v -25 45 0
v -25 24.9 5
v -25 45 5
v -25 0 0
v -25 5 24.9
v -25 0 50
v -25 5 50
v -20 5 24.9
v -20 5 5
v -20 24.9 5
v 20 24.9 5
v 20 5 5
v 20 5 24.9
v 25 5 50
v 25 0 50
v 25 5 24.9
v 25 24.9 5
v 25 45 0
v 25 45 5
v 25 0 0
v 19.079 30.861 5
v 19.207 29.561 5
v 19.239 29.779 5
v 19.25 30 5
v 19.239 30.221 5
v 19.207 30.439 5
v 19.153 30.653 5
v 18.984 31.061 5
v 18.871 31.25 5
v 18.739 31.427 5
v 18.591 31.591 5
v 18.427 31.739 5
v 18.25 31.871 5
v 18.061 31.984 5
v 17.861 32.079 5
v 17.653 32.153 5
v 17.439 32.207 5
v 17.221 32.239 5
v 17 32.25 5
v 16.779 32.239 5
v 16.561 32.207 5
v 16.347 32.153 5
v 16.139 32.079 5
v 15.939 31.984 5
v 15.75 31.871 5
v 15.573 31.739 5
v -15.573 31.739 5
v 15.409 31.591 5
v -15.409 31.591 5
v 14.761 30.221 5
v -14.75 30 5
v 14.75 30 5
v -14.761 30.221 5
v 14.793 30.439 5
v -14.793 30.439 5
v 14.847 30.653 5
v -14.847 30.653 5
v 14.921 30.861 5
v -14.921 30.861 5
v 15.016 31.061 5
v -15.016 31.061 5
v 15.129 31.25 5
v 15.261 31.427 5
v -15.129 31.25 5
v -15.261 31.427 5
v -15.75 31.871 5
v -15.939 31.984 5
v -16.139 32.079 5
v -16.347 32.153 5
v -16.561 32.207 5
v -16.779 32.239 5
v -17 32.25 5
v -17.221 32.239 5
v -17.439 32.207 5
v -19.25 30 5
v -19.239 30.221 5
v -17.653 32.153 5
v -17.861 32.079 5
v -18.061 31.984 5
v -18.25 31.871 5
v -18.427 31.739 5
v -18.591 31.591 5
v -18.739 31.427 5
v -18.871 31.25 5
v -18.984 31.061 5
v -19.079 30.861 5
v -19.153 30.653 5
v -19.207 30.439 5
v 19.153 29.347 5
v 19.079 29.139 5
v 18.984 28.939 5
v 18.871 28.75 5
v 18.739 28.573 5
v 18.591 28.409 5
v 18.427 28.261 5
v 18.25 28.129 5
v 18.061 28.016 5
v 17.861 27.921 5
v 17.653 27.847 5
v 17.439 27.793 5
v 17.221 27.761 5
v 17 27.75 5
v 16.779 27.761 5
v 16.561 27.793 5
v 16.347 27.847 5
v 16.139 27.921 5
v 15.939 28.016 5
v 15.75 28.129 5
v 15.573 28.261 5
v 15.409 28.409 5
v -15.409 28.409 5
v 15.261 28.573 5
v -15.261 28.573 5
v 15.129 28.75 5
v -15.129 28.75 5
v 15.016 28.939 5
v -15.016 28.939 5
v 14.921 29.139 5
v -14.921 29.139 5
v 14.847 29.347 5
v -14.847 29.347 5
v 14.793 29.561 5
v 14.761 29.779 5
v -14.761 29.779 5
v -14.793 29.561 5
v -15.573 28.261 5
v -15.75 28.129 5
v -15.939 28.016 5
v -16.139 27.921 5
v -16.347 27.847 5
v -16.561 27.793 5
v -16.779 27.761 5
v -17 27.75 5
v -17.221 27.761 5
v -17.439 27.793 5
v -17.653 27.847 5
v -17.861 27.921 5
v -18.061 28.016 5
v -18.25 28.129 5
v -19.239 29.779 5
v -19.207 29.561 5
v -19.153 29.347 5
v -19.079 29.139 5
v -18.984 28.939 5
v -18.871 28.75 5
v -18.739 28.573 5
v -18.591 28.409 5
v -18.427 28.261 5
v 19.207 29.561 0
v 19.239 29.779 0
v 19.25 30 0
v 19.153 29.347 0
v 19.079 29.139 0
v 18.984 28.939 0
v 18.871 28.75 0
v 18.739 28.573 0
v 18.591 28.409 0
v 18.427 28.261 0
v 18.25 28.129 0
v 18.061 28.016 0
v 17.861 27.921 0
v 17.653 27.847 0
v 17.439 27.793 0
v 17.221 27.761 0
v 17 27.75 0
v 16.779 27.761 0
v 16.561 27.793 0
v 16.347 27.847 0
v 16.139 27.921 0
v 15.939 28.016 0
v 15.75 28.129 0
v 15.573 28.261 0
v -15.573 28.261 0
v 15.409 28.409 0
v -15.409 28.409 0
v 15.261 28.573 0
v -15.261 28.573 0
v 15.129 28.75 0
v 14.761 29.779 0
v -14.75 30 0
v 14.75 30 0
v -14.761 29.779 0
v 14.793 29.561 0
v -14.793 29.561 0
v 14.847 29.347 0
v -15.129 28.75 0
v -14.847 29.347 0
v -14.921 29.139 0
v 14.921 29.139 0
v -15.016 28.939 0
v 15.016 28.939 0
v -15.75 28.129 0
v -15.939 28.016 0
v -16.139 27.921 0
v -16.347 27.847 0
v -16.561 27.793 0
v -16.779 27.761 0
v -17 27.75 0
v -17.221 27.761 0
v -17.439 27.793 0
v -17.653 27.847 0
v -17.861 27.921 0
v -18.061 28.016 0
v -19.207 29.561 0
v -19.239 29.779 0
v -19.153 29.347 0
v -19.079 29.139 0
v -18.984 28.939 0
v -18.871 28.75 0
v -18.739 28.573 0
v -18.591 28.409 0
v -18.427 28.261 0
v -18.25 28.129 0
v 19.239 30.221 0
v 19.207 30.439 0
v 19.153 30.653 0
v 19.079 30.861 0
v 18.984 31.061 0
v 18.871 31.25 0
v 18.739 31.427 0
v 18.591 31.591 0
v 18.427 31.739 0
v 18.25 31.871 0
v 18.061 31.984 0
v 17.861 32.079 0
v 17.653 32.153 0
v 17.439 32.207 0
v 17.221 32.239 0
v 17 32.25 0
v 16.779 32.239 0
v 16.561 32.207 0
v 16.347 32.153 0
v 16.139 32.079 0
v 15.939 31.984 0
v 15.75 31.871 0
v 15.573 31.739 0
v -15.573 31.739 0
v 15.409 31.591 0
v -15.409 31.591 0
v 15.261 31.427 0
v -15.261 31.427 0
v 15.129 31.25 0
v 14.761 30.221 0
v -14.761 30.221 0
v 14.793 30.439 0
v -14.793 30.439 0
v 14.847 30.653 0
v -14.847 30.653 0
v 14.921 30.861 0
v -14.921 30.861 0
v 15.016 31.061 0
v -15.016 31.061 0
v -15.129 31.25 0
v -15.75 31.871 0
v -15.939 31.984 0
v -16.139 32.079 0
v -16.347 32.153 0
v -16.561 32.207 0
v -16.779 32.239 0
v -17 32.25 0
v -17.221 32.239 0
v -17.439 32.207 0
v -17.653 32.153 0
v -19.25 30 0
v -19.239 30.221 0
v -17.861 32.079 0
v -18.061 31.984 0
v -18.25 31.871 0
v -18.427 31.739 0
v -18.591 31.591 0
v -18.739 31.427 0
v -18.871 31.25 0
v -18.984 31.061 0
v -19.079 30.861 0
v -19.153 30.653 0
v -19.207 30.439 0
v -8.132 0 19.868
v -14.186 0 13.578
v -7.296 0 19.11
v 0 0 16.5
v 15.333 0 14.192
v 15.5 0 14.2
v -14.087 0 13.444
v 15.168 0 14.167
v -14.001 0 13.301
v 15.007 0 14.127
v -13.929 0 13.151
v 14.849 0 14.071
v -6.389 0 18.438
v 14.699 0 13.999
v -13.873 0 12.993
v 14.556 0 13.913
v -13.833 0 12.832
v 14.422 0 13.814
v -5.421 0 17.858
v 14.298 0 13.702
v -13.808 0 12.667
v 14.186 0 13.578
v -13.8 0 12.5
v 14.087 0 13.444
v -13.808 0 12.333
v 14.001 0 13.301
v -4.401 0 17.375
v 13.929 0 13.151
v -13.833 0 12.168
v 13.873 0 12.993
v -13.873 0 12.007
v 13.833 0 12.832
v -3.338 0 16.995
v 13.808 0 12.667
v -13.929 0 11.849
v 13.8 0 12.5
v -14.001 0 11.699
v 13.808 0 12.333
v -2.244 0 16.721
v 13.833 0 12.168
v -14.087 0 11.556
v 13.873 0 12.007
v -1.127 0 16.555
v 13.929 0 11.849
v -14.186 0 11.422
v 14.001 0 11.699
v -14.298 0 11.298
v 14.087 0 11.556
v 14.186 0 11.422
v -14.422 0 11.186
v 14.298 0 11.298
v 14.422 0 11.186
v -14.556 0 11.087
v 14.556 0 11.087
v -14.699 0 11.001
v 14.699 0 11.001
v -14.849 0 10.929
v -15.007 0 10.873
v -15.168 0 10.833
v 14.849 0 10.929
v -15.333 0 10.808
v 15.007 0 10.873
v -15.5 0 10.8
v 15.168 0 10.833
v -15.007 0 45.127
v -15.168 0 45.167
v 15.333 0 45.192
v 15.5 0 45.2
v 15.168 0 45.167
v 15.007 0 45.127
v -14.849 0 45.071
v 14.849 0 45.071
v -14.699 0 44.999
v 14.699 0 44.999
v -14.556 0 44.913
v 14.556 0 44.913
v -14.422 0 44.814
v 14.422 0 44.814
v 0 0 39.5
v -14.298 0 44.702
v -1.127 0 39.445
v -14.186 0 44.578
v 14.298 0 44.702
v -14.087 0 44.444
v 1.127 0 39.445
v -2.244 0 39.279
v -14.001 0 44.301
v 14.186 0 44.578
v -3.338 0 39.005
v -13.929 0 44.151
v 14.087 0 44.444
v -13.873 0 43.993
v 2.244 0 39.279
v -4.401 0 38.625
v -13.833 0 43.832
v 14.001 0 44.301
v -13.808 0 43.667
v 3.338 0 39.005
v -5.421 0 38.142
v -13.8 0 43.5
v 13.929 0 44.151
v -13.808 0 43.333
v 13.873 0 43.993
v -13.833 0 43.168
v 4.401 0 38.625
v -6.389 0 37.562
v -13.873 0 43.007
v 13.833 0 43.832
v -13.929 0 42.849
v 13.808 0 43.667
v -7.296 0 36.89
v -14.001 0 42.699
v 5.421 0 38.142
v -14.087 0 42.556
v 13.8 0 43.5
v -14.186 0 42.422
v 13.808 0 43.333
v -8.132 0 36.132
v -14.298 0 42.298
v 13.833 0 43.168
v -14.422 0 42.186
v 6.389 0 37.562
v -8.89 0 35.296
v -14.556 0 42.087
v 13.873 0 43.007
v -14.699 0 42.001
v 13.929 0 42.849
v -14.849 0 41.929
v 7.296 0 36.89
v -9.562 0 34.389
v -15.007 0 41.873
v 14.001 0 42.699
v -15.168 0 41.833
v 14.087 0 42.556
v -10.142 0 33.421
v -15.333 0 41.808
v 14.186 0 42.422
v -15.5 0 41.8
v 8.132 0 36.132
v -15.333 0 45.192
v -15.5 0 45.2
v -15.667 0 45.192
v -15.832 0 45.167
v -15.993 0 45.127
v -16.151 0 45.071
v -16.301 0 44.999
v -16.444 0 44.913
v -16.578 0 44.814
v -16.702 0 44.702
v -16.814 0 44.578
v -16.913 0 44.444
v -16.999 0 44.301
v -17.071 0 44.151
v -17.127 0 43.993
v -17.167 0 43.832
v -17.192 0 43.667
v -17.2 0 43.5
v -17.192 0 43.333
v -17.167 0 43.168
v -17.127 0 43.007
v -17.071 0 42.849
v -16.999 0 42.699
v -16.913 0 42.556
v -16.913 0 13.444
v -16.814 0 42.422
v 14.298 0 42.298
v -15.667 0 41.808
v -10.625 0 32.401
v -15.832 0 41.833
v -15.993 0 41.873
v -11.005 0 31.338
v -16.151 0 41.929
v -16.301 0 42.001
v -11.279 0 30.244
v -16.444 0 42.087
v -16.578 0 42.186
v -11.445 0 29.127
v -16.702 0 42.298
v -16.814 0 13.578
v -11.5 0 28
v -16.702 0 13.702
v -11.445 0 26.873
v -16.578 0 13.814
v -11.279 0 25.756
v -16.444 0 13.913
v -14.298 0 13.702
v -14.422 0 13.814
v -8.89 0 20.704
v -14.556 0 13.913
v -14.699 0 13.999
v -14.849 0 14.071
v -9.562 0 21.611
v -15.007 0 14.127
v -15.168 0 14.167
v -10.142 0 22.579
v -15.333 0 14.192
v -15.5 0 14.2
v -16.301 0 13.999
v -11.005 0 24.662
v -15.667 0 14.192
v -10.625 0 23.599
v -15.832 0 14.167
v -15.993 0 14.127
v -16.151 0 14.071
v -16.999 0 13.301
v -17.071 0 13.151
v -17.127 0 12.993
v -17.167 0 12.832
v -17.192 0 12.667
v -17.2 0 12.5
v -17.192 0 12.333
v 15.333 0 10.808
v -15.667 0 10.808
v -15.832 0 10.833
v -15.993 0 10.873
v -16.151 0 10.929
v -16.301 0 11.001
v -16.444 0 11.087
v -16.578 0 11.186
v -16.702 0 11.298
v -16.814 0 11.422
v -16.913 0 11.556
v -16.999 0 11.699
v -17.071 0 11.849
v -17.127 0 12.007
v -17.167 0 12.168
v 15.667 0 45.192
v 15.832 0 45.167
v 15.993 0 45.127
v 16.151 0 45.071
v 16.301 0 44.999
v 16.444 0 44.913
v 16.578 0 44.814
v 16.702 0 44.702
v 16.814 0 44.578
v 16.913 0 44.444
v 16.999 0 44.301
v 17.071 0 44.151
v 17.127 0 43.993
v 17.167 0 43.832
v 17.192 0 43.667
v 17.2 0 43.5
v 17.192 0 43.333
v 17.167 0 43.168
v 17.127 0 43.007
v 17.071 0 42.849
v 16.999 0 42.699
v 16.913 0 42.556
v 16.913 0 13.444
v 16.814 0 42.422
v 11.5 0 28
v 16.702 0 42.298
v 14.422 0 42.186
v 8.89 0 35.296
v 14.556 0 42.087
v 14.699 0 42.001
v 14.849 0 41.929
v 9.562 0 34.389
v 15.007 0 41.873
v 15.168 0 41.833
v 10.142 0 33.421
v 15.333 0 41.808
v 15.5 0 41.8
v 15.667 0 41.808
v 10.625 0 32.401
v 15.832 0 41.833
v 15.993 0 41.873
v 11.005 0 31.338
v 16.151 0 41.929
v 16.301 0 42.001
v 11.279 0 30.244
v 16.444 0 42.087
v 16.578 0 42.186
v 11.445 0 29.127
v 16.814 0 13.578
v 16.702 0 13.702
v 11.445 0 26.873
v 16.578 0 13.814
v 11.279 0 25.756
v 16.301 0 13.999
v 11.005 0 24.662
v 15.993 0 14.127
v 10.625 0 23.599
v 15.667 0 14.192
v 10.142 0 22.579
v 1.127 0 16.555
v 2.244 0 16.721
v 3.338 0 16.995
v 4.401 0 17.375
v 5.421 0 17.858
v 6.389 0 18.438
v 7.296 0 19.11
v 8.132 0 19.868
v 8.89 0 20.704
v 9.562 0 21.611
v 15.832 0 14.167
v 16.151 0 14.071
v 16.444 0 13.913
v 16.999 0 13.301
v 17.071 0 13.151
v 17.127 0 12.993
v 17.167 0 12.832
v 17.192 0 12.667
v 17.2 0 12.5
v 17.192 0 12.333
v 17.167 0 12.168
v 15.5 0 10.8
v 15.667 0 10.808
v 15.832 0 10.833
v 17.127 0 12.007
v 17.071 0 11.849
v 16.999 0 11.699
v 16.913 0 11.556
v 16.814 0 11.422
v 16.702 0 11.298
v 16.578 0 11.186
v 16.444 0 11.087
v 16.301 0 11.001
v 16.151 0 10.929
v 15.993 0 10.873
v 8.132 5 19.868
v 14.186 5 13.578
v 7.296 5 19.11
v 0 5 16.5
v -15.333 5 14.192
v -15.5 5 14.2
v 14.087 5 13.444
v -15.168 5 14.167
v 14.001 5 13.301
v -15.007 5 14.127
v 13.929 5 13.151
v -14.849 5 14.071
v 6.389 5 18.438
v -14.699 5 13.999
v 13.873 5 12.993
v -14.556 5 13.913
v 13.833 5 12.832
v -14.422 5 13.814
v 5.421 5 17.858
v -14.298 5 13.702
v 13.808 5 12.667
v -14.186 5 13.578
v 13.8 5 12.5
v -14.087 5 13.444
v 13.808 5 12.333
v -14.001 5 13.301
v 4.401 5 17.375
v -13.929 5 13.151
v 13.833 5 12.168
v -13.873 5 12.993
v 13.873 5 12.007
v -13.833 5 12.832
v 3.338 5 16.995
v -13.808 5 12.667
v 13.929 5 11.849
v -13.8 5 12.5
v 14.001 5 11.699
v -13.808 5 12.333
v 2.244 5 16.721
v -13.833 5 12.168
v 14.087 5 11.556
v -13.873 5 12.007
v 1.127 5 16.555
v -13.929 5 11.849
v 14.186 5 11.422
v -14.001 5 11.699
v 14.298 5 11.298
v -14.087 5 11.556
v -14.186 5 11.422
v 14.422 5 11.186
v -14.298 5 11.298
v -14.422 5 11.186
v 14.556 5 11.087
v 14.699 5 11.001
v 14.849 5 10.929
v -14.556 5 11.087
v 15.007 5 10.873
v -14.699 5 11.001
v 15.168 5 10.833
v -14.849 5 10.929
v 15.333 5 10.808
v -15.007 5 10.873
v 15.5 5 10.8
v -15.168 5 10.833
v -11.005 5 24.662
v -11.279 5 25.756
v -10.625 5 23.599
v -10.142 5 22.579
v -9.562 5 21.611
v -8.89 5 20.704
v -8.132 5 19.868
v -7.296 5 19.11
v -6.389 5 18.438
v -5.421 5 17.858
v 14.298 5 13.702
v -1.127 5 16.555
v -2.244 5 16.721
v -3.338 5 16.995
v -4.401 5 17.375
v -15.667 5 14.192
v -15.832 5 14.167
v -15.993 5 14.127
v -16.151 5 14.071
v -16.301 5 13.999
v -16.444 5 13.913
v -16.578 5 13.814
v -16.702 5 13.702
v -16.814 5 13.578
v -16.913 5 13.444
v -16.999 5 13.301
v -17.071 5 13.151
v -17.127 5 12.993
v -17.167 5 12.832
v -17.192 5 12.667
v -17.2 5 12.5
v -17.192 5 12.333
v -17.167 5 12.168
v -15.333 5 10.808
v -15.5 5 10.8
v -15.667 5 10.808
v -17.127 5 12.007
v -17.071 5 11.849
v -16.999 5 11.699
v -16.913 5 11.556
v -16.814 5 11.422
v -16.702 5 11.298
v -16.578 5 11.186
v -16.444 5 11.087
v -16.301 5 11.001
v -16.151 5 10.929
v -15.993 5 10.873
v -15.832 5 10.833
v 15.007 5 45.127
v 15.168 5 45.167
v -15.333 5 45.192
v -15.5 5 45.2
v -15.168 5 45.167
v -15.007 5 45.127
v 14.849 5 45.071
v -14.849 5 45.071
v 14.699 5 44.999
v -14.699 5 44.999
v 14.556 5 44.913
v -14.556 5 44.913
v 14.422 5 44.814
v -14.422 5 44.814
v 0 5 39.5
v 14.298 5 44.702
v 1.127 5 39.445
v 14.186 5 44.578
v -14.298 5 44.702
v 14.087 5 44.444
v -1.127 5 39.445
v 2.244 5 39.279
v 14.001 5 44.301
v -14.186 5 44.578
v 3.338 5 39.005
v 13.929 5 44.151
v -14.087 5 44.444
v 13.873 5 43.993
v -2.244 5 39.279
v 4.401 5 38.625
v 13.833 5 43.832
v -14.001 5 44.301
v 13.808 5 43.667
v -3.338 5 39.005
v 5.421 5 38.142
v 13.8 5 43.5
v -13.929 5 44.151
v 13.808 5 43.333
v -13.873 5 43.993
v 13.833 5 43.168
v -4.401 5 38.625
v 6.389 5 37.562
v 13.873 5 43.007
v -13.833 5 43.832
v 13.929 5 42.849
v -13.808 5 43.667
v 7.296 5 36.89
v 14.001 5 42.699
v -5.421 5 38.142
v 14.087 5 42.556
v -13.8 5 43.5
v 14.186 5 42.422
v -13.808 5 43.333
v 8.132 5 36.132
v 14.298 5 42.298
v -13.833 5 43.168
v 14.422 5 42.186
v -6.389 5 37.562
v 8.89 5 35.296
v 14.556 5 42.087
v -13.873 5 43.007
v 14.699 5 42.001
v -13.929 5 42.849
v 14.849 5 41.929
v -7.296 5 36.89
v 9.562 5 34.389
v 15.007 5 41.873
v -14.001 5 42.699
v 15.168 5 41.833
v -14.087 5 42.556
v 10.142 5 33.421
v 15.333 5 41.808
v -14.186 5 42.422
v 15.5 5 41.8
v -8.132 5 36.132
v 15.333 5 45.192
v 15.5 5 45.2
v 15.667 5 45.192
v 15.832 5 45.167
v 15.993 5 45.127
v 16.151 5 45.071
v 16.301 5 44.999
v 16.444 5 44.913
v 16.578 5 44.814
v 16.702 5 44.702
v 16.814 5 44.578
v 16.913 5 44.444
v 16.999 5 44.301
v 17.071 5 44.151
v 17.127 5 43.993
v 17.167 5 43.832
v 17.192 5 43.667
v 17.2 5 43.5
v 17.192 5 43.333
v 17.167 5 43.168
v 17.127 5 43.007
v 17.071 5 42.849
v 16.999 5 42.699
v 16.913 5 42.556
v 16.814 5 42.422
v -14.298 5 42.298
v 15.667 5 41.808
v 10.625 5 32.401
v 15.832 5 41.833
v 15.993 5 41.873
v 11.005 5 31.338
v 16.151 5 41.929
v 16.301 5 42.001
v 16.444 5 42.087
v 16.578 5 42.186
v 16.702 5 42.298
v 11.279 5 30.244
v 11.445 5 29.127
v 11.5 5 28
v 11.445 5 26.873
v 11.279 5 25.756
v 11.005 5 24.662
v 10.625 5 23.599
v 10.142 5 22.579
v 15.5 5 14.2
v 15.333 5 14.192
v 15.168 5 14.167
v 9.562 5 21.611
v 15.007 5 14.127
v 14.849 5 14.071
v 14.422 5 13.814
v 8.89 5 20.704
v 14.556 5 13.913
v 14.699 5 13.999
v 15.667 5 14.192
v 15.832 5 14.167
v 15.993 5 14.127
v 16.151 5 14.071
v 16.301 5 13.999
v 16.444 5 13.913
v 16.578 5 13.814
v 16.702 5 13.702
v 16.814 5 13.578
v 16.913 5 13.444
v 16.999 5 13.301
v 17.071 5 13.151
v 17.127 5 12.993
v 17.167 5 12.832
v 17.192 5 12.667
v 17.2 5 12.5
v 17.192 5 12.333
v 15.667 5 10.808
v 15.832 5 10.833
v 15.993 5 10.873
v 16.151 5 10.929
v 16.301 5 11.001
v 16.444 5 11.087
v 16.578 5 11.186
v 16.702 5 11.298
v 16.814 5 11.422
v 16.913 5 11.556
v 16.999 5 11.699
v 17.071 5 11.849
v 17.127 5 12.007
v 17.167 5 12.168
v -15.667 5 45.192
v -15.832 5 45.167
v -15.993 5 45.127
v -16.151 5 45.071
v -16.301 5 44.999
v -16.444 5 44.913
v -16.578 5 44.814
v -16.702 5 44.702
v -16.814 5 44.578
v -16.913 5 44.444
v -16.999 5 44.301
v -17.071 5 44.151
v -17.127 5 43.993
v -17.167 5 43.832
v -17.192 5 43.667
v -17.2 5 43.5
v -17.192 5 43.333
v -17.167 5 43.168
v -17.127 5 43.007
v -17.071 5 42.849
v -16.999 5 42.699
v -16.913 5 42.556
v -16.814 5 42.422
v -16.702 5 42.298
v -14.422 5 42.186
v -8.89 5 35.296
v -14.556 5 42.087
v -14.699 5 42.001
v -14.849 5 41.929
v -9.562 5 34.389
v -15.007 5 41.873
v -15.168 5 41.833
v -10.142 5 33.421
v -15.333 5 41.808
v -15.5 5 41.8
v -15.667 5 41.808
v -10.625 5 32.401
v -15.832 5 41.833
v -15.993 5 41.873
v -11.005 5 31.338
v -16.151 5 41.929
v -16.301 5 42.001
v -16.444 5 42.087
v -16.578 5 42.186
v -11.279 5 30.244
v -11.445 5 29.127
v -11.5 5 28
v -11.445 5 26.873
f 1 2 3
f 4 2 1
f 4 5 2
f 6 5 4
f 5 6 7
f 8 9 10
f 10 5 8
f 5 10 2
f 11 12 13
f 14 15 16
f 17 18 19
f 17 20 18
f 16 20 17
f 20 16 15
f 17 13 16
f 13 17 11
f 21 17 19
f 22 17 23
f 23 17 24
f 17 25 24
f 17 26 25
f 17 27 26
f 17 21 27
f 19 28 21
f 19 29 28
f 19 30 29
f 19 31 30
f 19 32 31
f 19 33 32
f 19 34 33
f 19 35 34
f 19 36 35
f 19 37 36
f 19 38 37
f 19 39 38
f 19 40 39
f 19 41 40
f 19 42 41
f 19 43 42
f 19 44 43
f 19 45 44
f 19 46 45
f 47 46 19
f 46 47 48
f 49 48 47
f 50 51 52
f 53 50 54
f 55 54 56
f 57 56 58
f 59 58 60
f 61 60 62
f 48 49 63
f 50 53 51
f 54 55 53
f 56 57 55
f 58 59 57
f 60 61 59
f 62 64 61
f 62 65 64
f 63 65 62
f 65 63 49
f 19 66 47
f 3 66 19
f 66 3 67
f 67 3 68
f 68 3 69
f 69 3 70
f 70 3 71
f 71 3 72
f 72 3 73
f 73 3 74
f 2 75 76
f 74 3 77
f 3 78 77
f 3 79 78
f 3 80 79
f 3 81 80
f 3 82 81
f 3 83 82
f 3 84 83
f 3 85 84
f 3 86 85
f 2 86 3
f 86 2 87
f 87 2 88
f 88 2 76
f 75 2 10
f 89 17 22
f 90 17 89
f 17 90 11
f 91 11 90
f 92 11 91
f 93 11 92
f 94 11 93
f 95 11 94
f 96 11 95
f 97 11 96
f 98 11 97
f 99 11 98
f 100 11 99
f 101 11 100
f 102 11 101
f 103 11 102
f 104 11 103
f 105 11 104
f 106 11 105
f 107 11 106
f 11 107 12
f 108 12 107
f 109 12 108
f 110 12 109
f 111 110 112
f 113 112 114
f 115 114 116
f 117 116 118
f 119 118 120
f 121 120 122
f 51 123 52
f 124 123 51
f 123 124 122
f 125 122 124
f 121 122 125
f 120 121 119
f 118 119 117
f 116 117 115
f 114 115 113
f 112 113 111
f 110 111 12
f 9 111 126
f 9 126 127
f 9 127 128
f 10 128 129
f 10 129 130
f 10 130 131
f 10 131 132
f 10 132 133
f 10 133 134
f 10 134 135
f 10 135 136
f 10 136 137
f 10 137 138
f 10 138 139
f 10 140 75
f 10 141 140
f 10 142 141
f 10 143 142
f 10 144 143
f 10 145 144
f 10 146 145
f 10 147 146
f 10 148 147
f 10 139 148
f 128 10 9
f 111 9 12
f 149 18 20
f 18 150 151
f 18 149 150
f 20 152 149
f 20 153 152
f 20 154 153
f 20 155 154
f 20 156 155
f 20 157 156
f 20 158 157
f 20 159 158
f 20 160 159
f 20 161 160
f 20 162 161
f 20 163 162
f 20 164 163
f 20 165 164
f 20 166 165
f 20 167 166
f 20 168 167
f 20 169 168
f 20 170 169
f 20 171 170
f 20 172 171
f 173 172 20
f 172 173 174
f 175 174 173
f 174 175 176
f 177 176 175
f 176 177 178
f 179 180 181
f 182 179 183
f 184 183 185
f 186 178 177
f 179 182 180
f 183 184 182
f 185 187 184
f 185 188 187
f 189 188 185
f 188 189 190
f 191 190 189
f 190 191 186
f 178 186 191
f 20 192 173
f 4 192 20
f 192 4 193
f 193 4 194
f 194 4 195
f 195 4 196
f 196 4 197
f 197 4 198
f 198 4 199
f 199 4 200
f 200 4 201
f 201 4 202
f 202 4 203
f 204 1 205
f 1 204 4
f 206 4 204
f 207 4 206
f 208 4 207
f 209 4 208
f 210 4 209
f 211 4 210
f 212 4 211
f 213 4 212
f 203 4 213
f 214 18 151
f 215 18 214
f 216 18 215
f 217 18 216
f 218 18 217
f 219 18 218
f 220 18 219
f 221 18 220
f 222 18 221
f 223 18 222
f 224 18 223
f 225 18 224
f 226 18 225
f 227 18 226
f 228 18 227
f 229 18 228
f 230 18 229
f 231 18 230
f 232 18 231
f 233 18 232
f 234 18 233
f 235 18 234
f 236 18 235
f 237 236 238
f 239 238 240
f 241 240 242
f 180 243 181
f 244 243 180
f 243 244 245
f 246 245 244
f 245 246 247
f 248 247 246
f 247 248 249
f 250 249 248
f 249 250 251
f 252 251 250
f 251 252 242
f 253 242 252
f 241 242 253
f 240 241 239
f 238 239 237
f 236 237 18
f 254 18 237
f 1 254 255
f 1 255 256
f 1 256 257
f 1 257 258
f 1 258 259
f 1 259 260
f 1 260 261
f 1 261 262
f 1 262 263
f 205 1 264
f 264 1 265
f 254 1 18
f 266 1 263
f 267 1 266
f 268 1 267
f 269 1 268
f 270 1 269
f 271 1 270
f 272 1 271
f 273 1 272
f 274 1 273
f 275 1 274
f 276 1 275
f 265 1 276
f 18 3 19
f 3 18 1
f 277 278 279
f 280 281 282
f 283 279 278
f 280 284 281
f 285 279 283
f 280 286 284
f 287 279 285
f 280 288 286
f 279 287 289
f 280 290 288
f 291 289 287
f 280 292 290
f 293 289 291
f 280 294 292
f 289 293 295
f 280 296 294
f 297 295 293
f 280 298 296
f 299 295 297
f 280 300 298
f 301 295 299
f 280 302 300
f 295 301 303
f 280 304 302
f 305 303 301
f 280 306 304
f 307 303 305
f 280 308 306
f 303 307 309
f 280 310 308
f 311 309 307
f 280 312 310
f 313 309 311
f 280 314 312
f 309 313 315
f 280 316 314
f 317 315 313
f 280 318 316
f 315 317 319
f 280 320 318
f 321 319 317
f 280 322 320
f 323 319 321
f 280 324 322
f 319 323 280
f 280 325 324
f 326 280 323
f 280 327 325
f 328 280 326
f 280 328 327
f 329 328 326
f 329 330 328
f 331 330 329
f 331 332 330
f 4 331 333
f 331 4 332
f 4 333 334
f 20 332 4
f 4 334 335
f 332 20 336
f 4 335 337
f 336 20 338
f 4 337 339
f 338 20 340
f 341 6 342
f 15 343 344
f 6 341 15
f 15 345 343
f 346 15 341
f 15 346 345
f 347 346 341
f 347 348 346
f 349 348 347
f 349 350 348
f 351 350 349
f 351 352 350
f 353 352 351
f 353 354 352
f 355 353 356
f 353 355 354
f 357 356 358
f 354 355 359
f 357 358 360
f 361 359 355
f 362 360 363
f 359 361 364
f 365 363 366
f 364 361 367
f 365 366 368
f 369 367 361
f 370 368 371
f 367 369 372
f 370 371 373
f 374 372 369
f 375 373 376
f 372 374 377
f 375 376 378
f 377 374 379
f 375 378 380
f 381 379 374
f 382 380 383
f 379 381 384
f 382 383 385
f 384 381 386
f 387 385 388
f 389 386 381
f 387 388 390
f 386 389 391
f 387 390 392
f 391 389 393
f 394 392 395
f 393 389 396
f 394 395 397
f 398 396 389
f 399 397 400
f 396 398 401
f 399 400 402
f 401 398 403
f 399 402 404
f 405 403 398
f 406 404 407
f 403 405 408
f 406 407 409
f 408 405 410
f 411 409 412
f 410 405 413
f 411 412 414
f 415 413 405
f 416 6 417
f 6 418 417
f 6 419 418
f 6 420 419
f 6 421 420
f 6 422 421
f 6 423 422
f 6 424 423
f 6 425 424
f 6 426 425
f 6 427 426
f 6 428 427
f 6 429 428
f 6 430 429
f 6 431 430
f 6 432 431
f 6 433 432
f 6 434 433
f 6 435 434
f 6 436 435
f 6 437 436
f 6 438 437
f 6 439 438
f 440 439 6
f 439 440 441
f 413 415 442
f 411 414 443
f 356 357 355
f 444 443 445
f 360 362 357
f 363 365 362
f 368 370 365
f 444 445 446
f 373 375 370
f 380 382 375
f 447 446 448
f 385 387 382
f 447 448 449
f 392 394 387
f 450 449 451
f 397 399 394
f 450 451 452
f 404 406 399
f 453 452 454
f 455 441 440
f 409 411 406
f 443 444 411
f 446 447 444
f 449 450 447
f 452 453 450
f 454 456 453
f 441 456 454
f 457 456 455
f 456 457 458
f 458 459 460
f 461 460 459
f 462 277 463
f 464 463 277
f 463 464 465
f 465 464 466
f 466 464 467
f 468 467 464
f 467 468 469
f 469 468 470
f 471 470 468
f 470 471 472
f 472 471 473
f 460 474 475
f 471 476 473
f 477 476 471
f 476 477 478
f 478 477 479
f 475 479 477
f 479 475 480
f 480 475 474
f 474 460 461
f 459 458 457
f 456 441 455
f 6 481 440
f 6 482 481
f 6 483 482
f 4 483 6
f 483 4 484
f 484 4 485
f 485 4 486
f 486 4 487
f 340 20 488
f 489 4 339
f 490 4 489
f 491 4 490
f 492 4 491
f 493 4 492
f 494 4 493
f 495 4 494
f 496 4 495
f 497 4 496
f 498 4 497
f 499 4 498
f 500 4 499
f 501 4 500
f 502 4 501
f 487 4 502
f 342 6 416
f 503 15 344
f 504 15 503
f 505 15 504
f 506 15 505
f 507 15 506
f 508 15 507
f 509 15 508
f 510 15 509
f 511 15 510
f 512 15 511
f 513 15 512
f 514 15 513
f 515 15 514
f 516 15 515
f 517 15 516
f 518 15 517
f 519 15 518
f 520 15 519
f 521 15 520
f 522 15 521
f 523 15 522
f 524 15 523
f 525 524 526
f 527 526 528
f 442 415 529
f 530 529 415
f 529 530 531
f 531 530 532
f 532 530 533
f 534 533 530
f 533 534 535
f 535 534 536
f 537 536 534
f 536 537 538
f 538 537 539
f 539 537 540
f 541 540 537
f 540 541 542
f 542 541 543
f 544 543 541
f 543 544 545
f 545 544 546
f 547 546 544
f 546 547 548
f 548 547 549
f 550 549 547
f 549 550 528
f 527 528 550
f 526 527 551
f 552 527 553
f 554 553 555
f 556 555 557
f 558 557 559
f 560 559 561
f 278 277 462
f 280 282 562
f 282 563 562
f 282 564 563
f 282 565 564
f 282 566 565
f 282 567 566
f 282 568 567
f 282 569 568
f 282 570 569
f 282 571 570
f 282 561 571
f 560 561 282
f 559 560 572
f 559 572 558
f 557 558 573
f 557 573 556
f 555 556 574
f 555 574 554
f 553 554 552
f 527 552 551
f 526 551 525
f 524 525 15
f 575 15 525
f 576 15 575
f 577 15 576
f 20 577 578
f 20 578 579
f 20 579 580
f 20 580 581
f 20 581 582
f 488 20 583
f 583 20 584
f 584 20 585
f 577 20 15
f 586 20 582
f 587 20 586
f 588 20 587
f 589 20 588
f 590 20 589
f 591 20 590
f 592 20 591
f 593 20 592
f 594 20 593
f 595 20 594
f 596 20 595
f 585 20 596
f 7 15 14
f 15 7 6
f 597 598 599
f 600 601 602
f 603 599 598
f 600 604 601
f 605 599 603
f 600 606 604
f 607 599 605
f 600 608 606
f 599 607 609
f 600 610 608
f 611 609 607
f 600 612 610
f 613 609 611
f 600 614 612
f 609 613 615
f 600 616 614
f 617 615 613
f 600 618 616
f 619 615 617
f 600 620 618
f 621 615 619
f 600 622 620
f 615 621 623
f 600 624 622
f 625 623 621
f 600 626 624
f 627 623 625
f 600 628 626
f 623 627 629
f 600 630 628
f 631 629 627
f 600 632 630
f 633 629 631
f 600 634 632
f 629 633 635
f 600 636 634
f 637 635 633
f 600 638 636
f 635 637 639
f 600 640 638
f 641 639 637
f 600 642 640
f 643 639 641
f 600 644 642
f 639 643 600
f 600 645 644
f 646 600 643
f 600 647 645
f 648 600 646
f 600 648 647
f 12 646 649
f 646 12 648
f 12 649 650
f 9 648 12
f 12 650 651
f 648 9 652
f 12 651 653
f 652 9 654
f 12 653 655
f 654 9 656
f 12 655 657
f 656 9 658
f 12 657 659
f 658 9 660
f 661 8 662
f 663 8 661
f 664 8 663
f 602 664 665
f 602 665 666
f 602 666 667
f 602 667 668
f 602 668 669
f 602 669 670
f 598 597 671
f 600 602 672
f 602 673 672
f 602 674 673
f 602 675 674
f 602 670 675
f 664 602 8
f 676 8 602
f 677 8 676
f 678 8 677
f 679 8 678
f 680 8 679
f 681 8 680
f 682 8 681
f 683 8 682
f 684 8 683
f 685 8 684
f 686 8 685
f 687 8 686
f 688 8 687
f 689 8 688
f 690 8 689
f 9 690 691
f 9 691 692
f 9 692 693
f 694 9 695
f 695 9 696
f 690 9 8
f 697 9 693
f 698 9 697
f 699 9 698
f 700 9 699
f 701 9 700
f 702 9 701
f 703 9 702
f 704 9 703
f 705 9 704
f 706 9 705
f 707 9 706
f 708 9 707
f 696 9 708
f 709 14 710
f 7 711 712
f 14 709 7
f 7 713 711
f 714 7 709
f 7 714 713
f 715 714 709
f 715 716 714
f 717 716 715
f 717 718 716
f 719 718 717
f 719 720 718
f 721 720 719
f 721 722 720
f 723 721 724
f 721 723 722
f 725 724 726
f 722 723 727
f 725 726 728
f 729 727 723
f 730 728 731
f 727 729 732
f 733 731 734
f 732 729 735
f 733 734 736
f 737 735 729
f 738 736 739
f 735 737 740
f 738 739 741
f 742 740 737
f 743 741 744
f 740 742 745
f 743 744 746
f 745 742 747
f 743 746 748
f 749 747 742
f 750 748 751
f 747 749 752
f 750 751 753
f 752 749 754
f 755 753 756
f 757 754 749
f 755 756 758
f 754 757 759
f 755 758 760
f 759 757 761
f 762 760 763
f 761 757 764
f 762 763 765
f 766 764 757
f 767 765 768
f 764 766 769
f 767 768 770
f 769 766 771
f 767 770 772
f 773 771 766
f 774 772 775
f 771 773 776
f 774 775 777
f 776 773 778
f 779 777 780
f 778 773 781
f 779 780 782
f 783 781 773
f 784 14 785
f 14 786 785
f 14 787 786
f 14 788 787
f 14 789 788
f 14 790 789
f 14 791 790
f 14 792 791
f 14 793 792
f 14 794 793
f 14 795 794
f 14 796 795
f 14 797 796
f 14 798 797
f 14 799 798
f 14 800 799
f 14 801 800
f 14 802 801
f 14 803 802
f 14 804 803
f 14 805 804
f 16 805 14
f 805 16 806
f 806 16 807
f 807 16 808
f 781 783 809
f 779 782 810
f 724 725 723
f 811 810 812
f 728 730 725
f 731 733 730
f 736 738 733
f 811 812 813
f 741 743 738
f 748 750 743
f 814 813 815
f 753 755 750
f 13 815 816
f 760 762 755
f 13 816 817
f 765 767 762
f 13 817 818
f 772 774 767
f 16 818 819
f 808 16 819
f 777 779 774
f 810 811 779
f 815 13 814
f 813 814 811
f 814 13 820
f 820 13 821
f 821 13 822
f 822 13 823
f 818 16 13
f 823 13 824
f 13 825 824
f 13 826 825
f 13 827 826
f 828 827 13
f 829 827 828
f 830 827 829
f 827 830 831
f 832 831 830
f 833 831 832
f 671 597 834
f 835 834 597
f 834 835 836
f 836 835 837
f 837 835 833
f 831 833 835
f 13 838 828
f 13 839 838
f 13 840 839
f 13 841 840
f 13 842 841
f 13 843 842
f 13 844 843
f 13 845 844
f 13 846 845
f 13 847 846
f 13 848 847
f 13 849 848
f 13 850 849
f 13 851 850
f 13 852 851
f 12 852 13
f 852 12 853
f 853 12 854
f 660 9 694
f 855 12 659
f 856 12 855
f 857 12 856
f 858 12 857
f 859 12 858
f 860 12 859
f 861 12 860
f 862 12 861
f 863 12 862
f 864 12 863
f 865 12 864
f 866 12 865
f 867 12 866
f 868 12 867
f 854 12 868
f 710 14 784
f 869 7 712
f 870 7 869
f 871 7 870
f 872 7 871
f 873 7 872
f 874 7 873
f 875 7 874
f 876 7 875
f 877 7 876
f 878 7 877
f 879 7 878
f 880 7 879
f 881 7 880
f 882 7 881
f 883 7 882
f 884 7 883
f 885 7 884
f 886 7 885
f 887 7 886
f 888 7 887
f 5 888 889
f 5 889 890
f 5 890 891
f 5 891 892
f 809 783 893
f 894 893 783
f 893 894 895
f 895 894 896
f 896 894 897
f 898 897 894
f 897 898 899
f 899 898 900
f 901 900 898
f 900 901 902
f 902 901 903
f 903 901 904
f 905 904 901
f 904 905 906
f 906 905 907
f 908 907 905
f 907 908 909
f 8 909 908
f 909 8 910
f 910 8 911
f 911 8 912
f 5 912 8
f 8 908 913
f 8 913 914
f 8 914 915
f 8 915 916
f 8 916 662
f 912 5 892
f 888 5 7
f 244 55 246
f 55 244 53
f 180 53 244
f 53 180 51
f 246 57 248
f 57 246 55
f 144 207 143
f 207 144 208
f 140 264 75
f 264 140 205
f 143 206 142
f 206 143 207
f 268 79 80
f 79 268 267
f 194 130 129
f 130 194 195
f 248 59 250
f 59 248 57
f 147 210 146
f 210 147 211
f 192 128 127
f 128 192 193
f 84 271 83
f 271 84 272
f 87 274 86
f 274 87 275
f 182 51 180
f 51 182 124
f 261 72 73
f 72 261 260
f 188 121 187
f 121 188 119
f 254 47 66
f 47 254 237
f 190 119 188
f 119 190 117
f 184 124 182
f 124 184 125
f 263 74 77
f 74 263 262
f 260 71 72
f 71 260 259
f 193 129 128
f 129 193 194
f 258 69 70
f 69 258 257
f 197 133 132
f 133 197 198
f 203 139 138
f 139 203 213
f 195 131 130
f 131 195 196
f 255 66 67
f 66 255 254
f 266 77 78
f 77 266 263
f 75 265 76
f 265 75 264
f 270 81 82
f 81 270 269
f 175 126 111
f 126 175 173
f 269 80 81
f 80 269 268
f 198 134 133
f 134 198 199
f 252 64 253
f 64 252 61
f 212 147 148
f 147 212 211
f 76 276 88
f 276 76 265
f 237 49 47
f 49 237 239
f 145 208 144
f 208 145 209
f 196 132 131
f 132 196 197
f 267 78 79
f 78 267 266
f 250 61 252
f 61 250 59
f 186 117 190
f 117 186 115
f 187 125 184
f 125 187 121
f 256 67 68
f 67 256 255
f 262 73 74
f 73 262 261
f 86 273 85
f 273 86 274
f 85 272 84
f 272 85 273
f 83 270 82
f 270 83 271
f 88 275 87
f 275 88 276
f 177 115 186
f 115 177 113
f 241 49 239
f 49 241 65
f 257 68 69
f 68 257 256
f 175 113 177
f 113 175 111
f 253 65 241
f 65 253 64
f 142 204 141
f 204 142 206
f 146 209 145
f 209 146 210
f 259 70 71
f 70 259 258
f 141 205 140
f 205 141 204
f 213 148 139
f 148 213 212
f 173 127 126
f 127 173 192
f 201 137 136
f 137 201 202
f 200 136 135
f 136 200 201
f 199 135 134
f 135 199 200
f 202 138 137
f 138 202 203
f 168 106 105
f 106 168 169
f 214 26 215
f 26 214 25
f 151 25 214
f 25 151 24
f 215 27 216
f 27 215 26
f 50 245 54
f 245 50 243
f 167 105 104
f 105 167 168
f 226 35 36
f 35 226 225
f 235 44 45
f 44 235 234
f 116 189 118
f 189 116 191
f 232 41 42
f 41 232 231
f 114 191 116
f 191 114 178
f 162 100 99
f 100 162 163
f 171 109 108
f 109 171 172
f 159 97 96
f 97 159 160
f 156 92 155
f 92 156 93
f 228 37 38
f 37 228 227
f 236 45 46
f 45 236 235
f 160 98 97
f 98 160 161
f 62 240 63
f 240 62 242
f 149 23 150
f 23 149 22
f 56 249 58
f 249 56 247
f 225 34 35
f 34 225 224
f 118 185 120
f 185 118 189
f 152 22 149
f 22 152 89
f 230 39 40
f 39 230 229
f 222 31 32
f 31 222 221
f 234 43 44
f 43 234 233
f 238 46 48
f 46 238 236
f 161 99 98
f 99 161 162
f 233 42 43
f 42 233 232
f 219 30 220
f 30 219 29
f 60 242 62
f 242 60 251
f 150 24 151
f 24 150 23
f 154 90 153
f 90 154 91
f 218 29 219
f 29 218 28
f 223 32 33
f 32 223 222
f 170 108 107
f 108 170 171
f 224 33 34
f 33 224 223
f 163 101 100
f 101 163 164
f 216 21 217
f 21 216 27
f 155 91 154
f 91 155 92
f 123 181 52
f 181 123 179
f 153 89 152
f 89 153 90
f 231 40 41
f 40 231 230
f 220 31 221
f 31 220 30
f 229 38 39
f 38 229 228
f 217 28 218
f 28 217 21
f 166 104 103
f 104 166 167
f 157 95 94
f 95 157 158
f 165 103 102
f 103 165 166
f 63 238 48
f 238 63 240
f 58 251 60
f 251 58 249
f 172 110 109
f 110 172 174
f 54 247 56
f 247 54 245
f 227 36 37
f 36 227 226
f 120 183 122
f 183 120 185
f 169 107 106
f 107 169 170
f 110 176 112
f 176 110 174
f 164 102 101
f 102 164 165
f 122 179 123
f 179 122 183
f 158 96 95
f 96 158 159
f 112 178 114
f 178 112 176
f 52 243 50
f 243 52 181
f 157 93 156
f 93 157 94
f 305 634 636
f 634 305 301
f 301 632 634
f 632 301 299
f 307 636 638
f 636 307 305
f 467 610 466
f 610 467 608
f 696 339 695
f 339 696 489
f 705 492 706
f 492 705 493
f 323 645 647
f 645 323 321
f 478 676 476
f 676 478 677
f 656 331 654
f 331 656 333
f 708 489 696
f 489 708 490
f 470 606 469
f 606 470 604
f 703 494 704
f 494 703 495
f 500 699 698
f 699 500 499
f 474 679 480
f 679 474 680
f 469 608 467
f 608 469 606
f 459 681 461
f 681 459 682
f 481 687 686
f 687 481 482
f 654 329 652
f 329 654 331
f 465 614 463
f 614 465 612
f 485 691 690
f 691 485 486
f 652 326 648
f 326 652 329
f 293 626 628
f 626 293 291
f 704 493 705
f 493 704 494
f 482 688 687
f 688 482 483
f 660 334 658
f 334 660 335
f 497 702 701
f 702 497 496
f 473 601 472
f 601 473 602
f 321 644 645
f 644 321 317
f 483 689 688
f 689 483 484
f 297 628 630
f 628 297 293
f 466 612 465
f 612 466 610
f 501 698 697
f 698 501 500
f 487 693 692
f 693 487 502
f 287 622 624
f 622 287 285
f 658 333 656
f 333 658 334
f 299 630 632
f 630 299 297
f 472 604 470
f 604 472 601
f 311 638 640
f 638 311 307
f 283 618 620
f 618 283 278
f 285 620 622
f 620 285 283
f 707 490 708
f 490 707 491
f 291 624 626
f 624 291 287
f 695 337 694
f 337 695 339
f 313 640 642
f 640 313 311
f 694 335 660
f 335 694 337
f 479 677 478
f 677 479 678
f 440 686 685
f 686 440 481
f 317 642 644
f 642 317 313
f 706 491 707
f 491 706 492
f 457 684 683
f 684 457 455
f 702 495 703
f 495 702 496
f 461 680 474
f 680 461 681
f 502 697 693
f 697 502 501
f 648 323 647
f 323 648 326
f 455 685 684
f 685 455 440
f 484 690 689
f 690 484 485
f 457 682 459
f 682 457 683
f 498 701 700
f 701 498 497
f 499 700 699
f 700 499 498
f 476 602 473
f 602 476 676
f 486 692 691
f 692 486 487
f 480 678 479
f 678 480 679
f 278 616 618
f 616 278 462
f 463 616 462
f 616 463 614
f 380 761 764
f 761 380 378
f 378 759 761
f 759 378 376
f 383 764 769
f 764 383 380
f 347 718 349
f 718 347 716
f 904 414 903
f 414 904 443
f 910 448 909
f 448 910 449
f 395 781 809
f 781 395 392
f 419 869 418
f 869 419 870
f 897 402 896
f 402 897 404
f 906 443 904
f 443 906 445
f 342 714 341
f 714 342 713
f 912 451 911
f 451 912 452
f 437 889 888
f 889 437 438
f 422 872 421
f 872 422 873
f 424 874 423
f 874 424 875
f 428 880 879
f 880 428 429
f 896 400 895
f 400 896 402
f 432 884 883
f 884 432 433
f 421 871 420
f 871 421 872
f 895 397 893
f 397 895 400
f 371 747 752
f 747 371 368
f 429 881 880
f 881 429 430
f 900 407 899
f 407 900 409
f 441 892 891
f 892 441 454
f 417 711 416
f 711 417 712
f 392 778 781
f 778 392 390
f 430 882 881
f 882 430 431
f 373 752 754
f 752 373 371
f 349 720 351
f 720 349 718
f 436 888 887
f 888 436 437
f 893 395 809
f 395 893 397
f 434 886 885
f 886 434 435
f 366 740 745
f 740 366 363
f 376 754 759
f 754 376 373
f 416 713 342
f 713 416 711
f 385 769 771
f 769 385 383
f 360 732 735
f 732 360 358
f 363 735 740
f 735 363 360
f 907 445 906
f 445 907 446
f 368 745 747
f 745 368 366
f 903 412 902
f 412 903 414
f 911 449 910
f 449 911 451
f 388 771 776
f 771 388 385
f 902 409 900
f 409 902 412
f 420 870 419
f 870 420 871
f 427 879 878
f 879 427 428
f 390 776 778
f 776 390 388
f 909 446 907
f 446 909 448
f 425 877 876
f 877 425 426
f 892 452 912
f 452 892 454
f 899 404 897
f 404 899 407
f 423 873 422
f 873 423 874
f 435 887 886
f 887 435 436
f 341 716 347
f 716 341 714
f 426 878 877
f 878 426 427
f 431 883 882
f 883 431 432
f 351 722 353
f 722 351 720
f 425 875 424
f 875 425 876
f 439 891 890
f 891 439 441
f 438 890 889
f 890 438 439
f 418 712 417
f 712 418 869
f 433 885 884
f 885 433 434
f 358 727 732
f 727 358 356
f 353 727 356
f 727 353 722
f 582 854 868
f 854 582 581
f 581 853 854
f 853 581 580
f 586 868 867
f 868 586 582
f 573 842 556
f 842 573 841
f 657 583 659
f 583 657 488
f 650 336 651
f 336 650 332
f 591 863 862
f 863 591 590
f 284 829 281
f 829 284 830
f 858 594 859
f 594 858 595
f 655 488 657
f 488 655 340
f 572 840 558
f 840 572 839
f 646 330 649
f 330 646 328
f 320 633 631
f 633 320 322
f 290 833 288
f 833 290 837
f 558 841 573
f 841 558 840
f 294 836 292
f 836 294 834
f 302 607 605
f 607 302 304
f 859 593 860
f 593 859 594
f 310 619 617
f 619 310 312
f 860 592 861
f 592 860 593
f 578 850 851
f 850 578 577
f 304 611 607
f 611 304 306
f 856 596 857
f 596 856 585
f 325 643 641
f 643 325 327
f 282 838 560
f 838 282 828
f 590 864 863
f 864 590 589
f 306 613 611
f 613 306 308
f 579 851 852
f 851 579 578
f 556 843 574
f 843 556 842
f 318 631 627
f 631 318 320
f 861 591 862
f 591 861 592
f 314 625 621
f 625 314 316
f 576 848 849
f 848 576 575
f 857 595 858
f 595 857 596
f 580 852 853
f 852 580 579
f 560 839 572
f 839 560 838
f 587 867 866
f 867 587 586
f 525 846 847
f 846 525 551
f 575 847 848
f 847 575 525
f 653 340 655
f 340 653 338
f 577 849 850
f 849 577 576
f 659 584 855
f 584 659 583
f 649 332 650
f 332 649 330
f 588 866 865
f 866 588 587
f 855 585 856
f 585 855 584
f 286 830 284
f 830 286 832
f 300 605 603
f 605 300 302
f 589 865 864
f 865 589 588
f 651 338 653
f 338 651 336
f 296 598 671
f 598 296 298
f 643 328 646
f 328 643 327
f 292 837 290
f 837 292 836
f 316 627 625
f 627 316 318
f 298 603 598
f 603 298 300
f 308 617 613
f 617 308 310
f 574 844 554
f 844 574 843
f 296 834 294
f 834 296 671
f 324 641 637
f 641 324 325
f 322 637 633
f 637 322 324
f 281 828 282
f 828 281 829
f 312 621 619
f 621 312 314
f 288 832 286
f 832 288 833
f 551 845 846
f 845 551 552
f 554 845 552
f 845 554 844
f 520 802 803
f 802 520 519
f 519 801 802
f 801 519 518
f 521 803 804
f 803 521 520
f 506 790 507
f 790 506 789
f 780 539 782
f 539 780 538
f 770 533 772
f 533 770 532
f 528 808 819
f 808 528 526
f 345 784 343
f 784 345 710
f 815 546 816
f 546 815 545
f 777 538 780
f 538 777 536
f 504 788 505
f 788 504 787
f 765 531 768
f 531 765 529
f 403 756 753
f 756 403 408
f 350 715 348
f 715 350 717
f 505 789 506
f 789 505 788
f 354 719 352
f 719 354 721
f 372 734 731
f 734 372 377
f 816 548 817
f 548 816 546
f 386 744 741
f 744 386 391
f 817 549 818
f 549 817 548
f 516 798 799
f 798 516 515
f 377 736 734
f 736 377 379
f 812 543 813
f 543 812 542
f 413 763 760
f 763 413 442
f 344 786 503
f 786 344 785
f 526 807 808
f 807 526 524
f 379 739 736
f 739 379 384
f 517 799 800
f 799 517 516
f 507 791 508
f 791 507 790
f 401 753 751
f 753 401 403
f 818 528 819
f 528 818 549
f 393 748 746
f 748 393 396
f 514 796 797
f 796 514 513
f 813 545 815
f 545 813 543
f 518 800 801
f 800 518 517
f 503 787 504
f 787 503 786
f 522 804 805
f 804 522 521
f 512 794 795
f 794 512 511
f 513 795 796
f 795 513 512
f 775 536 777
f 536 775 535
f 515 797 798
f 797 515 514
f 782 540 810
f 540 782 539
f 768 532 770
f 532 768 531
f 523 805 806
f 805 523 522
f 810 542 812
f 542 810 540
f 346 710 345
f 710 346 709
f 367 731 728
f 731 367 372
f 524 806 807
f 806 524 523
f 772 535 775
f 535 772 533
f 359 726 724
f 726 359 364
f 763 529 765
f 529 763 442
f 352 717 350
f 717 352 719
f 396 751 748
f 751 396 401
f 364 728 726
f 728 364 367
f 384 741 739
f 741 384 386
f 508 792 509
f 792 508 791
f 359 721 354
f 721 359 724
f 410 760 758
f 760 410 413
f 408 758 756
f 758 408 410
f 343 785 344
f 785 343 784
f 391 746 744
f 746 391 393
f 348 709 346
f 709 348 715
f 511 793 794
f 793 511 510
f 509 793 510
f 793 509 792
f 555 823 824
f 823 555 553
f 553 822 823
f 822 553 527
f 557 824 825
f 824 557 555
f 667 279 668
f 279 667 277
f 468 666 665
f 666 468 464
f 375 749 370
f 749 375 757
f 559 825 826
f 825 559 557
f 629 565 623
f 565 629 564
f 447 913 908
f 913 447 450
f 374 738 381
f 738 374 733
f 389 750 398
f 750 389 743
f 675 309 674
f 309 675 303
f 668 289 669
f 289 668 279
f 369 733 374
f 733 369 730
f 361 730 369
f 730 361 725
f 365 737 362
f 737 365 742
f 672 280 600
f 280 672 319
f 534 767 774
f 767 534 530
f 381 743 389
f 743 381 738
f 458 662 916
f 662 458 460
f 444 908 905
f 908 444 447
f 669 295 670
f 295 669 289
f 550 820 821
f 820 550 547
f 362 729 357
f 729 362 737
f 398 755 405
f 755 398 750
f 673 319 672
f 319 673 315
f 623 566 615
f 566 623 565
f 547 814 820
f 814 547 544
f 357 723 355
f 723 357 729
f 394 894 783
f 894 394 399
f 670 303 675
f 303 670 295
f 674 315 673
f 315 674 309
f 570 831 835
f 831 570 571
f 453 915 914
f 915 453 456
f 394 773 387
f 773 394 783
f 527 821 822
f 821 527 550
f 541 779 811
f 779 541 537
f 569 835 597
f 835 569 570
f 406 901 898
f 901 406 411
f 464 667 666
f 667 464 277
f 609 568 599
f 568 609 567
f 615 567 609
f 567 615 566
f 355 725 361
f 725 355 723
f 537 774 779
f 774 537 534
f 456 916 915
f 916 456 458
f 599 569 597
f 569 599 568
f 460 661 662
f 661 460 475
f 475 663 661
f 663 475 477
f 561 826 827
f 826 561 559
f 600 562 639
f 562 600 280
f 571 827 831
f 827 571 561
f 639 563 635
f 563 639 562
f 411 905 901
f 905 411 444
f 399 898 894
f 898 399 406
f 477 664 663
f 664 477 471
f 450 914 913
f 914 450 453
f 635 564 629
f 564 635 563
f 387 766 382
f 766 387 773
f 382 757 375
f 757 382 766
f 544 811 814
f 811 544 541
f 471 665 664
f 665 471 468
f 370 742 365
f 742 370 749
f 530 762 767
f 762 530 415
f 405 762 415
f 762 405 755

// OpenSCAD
// NEMA 17 L-shaped motor bracket (print: base plate on bed)

$fn = 64;

// Overall plate dimensions
plate_w      = 50;    // width in X (-25 to 25)
base_depth   = 45;    // base plate length in Y (0 to 45)
base_t       = 5;     // base plate thickness in Z
wall_t       = 5;     // motor plate thickness in Y
wall_h       = 50;    // motor plate height in Z

// Base mounting holes (M4 clearance)
base_hole_d  = 4.5;   // diameter
base_hole_x  = 17;    // |x| position
base_hole_y  = 30;    // y position

// Motor plate holes
boss_d       = 23;    // centring boss hole diameter
boss_z       = 28;    // boss hole centre height
m3_d         = 3.4;   // M3 screw hole diameter
m3_pitch     = 31;    // square pattern side length

// Gussets
gus_t        = 5;     // gusset thickness in X
gus_leg_y    = 20;    // leg along Y
gus_leg_z    = 20;    // leg along Z
gus_x_outer  = 25;    // outer X edge

eps = 0.1;            // cutting overshoot

difference() {
    union() {
        // base plate
        translate([-plate_w/2, 0, 0])
            cube([plate_w, base_depth, base_t]);
        // motor plate
        translate([-plate_w/2, 0, 0])
            cube([plate_w, wall_t, wall_h]);
        // gussets (left and right)
        for (sx = [-1, 1]) {
            x0 = (sx < 0) ? -gus_x_outer : gus_x_outer - gus_t;
            translate([x0, 0, 0])
                rotate([90, 0, 90])
                    linear_extrude(height = gus_t)
                        polygon([
                            [wall_t - eps, base_t - eps],
                            [wall_t + gus_leg_y, base_t - eps],
                            [wall_t - eps, base_t + gus_leg_z]
                        ]);
        }
    }

    // base through-holes
    for (sx = [-1, 1])
        translate([sx * base_hole_x, base_hole_y, -1])
            cylinder(d = base_hole_d, h = base_t + 2);

    // boss hole through motor plate (along Y)
    translate([0, -1, boss_z])
        rotate([-90, 0, 0])
            cylinder(d = boss_d, h = wall_t + 2);

    // four M3 holes on square pattern
    for (sx = [-1, 1], sz = [-1, 1])
        translate([sx * m3_pitch/2, -1, boss_z + sz * m3_pitch/2])
            rotate([-90, 0, 0])
                cylinder(d = m3_d, h = wall_t + 2);
}
